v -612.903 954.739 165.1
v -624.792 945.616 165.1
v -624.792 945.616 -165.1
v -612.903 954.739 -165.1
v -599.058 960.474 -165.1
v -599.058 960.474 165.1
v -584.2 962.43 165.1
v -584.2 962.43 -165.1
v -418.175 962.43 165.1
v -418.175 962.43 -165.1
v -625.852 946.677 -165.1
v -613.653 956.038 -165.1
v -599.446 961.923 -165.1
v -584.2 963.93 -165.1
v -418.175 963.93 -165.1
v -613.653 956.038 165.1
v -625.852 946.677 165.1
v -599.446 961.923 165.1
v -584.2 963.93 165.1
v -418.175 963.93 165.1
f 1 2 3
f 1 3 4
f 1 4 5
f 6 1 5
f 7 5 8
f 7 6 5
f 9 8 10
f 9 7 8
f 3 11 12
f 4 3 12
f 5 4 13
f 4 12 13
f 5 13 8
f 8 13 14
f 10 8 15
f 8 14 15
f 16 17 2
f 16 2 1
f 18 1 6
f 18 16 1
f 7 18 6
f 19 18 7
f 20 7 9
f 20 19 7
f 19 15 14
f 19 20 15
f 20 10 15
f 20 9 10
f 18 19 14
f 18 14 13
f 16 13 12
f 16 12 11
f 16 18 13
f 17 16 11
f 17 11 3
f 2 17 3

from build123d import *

# Parameters (mm, degrees)
EXTRUDE_THIN1_DEPTH = 165.1


with BuildPart() as part:
    # Sketch1 → Extrude-Thin1 (new body, symmetric)
    with BuildSketch(Plane.XY):
        with BuildLine():
            Line((-418.175, 963.93), (-584.2, 963.93))
            ThreePointArc((-584.2, 963.93), (-606.742034443, 959.446110563), (-625.852248486, 946.677073774))
            Line((-625.852248486, 946.677073774), (-624.791588314, 945.616413602))
            ThreePointArc((-624.791588314, 945.616413602), (-606.168009294, 958.060291265), (-584.2, 962.43))
            Line((-584.2, 962.43), (-418.175, 962.43))
            Line((-418.175, 962.43), (-418.175, 963.93))
        make_face()
    extrude(amount=EXTRUDE_THIN1_DEPTH, both=True)


solid = part.part
